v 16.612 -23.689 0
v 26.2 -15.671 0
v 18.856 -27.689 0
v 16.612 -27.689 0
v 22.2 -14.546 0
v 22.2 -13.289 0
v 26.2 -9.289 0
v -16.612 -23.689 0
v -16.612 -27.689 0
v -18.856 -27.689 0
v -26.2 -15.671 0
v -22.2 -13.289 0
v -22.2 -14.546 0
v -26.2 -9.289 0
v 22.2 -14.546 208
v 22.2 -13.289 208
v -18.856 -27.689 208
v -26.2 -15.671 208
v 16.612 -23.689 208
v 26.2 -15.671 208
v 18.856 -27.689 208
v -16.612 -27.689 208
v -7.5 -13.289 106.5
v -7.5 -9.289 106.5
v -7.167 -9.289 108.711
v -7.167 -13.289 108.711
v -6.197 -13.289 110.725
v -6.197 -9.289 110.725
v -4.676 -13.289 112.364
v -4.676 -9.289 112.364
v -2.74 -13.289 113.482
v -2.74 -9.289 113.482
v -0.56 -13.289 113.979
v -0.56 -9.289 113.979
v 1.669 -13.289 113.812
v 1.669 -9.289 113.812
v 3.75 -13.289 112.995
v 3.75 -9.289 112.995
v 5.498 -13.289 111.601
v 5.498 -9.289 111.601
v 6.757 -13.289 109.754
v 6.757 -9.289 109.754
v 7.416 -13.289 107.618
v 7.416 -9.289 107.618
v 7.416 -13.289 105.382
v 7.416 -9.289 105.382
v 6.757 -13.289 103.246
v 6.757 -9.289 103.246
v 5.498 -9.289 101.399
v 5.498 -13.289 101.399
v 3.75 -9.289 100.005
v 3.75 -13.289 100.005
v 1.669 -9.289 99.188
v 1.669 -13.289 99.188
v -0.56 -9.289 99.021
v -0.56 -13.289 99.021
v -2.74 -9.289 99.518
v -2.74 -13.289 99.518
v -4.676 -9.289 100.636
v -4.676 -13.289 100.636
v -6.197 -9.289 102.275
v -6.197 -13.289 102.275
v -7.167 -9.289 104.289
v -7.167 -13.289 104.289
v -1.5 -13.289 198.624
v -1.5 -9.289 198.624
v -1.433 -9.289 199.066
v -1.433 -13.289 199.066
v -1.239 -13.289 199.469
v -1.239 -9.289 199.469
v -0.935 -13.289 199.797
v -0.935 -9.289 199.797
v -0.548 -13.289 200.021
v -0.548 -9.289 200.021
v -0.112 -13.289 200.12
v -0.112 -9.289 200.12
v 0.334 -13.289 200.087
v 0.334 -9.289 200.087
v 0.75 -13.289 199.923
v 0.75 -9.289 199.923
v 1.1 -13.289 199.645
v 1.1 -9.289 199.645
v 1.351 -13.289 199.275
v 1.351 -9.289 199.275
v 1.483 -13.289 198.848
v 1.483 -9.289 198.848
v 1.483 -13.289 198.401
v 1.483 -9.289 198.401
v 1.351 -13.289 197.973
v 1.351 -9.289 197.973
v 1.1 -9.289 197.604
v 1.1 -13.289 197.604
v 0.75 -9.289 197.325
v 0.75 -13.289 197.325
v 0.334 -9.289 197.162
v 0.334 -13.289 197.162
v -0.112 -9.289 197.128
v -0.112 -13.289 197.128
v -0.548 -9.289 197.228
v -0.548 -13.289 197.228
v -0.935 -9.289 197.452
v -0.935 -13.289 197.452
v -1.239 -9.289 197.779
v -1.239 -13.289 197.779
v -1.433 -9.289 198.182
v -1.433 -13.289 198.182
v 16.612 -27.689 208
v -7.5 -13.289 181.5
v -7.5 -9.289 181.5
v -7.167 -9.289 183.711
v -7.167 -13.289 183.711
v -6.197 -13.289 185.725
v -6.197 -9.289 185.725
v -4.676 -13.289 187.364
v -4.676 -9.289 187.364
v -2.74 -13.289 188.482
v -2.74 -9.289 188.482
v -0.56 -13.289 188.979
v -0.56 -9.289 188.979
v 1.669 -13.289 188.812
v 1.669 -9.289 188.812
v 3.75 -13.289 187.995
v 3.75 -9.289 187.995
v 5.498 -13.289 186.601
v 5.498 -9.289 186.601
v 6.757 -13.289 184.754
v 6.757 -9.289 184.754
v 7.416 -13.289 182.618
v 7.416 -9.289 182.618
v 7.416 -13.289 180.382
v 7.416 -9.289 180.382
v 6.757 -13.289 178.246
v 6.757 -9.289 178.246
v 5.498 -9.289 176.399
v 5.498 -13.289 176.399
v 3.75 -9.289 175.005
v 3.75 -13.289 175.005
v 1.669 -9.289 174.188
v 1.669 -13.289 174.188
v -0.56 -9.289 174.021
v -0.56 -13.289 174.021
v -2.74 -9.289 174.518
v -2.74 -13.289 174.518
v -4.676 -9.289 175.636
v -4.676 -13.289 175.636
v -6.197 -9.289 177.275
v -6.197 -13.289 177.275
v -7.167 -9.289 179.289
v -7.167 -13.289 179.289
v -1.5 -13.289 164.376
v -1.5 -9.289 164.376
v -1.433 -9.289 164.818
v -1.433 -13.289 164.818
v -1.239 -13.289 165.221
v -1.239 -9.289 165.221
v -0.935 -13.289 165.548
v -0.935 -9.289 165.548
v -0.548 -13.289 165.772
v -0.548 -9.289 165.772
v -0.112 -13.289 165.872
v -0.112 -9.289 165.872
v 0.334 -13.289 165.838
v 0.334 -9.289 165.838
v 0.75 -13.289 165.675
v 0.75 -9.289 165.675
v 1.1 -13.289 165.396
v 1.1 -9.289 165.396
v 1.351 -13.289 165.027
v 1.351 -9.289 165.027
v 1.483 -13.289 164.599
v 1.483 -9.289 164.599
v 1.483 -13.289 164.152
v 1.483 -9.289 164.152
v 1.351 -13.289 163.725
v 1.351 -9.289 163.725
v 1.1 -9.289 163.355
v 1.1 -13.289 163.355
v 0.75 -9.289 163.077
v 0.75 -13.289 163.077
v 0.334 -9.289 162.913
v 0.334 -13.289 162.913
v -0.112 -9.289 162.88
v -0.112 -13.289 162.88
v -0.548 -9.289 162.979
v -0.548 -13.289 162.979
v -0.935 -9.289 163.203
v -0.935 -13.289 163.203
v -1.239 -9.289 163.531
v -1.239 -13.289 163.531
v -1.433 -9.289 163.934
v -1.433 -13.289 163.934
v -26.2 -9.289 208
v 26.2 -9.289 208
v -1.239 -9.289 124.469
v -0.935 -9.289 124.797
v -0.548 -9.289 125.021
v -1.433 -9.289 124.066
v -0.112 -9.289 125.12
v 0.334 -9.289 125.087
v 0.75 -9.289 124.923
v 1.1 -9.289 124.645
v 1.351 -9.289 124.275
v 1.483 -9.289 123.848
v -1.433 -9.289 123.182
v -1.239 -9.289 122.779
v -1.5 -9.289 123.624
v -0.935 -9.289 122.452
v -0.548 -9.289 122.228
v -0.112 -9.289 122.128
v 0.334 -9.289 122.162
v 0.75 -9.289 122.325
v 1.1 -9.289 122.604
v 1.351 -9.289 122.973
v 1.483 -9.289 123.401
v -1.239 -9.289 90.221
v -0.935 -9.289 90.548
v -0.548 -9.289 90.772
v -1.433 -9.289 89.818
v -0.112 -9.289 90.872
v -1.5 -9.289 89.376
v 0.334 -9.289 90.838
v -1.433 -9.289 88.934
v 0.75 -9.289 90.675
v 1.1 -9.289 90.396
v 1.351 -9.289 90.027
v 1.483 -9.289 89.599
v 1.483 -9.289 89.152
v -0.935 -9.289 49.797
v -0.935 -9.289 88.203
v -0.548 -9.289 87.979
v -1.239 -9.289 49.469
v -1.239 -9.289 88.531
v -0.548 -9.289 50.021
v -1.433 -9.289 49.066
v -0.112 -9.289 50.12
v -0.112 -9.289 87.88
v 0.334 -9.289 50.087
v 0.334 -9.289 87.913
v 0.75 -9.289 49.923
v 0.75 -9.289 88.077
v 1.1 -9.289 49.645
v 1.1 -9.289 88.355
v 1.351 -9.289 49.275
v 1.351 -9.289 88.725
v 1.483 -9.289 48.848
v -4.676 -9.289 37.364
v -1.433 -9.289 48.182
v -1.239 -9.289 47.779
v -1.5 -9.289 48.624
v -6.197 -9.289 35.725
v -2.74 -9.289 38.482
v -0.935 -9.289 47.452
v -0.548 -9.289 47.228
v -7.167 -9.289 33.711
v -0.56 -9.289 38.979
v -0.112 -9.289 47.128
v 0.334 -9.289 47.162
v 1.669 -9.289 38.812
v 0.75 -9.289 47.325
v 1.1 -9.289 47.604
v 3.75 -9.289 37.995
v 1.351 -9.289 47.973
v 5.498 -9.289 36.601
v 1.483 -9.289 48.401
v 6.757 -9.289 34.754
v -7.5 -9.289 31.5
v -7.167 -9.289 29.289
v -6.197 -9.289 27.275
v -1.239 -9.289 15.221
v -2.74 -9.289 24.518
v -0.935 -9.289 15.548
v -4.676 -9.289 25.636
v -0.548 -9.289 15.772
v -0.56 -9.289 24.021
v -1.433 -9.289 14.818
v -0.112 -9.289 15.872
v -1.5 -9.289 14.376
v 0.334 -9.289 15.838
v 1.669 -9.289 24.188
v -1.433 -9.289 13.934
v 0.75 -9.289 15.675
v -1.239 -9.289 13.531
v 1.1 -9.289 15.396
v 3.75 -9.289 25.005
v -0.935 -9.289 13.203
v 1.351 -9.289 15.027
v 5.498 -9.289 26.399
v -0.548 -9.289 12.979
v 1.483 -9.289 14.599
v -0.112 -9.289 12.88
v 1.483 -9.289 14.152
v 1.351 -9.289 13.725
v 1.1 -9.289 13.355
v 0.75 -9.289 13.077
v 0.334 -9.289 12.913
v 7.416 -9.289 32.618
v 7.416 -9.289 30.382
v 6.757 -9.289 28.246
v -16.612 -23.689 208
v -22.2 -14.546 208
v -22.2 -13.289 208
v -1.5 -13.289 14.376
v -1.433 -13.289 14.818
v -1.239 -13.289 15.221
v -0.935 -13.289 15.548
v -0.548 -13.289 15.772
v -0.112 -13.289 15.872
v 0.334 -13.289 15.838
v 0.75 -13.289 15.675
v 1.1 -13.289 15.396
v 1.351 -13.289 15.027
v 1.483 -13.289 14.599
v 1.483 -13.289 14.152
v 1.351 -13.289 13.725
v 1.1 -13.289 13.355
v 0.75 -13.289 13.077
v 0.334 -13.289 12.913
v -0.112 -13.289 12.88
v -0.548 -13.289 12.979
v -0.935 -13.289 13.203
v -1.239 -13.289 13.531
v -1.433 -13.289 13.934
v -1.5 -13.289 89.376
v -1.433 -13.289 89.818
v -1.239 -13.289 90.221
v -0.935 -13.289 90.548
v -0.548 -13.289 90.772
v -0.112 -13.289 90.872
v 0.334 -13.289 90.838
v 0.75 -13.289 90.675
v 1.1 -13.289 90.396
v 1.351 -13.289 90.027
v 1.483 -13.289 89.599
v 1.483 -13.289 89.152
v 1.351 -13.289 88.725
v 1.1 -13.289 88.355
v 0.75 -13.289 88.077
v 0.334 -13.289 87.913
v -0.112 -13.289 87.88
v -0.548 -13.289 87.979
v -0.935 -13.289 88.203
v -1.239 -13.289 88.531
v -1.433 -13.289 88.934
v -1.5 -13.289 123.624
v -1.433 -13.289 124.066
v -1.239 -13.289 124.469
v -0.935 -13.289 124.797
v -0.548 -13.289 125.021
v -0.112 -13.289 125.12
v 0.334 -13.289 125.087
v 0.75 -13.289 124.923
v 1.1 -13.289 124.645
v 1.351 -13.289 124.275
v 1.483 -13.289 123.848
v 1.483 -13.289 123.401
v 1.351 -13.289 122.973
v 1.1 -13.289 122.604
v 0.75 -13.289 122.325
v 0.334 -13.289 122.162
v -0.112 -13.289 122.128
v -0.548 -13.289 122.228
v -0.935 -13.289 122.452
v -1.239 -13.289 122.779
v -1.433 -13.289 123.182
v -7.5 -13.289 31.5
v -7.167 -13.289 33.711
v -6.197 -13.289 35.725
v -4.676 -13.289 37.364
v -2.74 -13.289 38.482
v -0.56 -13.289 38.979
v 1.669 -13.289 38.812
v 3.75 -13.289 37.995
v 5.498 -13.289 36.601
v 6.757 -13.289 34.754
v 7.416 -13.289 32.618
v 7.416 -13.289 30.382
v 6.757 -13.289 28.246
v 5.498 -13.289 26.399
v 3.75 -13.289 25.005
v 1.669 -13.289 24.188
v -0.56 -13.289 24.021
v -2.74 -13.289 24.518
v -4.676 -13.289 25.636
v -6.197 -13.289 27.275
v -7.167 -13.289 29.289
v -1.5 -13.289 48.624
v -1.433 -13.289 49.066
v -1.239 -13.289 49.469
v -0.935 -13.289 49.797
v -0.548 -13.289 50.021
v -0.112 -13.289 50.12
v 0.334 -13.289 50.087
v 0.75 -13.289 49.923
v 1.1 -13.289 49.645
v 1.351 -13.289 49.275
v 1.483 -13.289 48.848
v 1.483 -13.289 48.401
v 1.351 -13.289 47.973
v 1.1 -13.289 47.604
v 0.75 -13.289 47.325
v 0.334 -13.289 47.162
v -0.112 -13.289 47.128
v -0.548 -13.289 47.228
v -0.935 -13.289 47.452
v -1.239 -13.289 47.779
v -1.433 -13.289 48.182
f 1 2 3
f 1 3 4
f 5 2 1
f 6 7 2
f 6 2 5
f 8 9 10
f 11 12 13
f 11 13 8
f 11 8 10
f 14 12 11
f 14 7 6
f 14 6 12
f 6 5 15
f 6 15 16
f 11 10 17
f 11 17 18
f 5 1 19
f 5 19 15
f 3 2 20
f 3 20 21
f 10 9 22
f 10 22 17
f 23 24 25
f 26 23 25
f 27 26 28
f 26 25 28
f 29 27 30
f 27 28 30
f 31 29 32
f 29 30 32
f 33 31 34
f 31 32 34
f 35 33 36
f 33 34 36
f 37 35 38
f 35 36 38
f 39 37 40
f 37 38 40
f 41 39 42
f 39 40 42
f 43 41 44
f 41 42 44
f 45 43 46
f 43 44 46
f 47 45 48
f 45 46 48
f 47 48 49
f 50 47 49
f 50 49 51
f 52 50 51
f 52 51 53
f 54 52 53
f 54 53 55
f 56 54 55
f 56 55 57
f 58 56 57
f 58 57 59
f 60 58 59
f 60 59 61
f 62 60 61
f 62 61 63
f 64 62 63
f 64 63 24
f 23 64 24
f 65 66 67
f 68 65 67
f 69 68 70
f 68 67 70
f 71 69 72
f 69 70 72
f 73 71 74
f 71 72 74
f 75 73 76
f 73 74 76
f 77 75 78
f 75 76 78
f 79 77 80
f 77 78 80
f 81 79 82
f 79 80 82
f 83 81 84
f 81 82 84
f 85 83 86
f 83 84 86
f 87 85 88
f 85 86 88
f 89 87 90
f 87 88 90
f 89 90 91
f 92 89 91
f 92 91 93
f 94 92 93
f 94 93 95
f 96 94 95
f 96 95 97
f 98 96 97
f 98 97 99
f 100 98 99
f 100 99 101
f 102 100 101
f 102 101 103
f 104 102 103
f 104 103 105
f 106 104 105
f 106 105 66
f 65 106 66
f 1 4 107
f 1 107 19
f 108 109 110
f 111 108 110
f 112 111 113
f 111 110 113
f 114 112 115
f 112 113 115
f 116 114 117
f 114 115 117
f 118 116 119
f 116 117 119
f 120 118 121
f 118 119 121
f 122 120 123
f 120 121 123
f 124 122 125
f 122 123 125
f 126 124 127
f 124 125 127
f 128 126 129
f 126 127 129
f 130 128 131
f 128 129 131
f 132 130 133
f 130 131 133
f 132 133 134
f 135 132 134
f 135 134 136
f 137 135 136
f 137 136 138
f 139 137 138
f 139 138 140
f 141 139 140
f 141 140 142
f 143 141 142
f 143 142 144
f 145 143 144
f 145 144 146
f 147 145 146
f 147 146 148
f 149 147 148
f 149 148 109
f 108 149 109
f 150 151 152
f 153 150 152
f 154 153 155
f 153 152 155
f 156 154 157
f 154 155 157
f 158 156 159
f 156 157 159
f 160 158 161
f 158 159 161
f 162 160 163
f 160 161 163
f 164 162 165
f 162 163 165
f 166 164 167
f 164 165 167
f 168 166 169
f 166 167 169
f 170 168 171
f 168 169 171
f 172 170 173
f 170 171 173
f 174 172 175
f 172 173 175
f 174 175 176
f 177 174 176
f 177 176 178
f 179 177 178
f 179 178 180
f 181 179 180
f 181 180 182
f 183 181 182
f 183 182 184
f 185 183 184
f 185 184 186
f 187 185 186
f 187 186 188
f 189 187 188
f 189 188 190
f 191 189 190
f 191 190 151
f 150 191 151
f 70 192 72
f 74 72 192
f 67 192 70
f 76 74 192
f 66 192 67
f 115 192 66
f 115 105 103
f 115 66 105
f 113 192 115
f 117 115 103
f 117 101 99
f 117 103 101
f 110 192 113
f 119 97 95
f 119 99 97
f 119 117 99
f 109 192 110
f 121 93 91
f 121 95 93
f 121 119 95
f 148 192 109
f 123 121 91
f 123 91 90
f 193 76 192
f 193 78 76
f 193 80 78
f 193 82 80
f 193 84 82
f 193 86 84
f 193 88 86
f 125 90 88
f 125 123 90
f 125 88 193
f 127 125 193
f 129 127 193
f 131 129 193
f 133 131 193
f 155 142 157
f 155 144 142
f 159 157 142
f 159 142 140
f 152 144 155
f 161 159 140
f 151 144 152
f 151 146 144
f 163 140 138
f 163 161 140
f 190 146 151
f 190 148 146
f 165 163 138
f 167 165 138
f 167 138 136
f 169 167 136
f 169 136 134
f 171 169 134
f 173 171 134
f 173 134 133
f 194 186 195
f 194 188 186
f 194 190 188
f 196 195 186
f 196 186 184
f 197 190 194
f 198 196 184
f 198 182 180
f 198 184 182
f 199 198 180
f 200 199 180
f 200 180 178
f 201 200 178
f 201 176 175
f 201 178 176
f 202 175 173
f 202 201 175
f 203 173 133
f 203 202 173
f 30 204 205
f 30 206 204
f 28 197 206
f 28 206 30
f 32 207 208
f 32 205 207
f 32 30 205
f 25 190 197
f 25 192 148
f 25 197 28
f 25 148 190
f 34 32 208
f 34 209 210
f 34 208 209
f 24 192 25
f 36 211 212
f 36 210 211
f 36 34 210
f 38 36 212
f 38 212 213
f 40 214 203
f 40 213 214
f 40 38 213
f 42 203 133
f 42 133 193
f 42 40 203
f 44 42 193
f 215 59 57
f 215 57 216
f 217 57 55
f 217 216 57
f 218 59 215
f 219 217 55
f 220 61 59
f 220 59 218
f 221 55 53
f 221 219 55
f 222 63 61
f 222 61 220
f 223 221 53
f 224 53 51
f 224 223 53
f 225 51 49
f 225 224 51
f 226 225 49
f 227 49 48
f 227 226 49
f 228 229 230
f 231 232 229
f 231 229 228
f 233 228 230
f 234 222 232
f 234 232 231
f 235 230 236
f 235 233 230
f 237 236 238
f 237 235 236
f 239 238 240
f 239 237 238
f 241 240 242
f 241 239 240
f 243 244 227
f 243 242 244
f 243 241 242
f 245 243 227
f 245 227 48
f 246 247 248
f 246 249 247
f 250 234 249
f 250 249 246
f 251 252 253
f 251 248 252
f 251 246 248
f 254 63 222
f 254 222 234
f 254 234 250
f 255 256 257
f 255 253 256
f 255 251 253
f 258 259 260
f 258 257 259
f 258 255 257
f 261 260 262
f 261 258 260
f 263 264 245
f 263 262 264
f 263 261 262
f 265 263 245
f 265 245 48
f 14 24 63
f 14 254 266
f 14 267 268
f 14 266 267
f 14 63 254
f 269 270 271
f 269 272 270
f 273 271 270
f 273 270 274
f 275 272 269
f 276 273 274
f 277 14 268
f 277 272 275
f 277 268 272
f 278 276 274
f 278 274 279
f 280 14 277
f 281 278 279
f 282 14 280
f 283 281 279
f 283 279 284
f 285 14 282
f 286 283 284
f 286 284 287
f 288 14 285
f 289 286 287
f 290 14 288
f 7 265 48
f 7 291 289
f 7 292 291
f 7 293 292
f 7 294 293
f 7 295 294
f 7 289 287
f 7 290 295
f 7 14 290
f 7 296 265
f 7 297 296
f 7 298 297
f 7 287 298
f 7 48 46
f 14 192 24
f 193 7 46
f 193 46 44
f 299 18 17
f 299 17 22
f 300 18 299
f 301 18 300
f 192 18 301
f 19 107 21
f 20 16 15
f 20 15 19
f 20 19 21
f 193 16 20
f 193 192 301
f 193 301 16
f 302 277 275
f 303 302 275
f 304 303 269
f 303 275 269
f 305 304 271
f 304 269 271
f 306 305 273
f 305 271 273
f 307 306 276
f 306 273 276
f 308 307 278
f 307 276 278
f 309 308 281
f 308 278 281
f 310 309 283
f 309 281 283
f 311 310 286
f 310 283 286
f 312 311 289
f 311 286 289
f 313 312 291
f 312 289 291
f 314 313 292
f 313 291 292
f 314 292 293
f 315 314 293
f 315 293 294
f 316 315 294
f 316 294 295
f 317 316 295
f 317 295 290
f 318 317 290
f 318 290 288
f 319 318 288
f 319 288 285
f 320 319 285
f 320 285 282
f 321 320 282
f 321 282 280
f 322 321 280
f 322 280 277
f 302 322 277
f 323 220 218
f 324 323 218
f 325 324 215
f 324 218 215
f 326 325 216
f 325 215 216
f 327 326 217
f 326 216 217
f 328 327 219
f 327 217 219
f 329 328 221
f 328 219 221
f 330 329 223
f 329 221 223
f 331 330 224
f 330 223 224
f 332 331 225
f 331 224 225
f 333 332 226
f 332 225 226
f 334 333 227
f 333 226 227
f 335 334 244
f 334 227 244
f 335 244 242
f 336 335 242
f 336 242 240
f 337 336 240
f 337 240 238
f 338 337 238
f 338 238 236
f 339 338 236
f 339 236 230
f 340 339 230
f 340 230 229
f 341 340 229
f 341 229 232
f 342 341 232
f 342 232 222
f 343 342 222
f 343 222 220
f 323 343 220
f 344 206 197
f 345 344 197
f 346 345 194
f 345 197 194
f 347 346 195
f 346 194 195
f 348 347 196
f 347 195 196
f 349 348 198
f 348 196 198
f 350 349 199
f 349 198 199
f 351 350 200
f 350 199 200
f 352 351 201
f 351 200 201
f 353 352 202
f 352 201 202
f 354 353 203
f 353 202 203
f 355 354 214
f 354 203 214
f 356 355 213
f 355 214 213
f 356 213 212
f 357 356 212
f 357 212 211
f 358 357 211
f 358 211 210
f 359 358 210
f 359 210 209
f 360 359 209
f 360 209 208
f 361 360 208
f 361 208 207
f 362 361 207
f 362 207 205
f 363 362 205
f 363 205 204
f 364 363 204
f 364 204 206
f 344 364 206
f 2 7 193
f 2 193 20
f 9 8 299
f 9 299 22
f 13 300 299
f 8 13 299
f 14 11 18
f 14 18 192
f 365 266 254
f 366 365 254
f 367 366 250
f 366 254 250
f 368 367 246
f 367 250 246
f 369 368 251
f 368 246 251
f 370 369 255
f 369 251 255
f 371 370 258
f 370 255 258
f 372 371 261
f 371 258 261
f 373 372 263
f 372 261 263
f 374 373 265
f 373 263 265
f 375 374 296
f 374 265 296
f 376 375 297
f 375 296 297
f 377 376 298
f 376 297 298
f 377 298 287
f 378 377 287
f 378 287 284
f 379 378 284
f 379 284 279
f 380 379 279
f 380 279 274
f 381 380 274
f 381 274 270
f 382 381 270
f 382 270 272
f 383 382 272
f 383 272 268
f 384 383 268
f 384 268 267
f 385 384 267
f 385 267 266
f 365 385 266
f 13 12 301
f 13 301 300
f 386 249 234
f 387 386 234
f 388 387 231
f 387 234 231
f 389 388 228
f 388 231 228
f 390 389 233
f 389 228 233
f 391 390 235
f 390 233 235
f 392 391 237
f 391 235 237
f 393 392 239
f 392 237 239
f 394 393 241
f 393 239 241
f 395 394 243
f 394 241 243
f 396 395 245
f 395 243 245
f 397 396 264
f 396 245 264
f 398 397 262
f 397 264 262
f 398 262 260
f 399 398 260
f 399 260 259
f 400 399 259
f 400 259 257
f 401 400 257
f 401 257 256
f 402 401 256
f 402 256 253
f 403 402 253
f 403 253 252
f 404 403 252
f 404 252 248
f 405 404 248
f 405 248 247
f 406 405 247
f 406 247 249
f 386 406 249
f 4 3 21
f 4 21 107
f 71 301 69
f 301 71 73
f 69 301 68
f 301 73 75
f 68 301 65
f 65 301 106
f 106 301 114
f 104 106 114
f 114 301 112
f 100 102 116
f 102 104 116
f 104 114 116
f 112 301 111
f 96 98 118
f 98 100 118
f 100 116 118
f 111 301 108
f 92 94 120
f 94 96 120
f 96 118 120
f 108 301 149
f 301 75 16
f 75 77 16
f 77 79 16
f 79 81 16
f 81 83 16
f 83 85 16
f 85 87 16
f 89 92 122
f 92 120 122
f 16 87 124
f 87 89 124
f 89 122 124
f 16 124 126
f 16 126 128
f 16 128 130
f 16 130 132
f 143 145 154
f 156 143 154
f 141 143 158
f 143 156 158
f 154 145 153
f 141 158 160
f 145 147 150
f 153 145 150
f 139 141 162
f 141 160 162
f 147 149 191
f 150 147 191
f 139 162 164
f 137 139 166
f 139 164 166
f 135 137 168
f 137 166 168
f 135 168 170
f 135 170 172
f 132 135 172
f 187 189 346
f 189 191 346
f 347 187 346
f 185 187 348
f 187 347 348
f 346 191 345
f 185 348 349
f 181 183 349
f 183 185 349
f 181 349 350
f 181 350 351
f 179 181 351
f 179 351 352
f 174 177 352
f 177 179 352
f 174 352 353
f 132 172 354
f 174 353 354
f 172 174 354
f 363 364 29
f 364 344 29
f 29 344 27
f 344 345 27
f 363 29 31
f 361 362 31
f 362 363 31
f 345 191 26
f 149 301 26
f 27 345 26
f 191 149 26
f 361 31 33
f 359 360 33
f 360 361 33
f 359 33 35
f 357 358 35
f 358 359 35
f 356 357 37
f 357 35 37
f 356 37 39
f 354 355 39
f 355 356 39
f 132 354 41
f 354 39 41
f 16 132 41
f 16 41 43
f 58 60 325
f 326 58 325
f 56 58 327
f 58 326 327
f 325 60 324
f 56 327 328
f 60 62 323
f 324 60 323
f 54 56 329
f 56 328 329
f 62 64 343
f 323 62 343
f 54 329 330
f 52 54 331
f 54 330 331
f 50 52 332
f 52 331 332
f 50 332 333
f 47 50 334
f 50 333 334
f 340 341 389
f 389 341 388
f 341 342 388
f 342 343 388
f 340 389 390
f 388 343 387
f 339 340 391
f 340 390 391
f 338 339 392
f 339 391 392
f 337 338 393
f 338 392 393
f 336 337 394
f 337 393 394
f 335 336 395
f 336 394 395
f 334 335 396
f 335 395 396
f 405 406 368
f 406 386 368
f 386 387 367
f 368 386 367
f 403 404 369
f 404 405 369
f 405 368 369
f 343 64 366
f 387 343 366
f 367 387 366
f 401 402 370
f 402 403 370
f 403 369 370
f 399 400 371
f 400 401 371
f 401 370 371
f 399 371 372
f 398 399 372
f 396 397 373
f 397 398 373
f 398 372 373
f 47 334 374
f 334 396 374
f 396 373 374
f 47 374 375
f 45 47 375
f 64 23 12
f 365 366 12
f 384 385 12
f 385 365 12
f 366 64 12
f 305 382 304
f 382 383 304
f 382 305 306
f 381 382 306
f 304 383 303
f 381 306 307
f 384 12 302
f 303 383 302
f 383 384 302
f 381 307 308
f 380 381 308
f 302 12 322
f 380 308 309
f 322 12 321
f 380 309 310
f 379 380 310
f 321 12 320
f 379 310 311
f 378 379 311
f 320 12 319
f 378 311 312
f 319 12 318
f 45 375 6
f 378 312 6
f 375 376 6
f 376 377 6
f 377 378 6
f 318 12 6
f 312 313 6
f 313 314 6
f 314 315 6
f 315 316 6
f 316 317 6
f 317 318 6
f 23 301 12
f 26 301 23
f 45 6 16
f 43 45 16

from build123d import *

# Parameters (mm, degrees)
BOSS_EXTRUDE1_DEPTH        = 213
SKETCH2_R                  = 7.5
CUT_EXTRUDE1_DEPTH         = 213
SKETCH7_R                  = 1.5
CUT_EXTRUDE2_DEPTH         = 10
LPATTERN1_COUNT            = 3
LPATTERN1_PITCH            = 75
SZKIC1_W                   = 52.4
SZKIC1_H                   = 5
WYTNIJ_WYCI_GNI_CIE1_DEPTH = 30.5


with BuildPart() as part:
    # Sketch1 → Boss-Extrude1 (new body)
    with BuildSketch(Plane.XY):
        Polygon((0, -13.289354466), (-22.2, -13.289354466), (-22.2, -14.545627613), (-16.612166923, -23.689354466), (-16.612166923, -27.689354466), (-18.855505392, -27.689354466), (-26.2, -15.671090562), (-26.2, -9.289354466), (26.2, -9.289354466), (26.2, -15.671090562), (18.855505392, -27.689354466), (16.612166923, -27.689354466), (16.612166923, -23.689354466), (22.2, -14.545627613), (22.2, -13.289354466), align=None)
    extrude(amount=BOSS_EXTRUDE1_DEPTH)

    # Sketch2 → Cut-Extrude1 (cut)
    with BuildSketch(Plane(origin=(0, -9.289354466, 0), x_dir=(1, 0, 0), z_dir=(0, 1, 0))):
        with Locations(Location((0, -31.5, 0), (0, 0, 180))):
            Circle(SKETCH2_R)
        with Locations(Location((0, -106.5, 0), (0, 0, 180))):
            Circle(SKETCH2_R)
        with Locations(Location((0, -181.5, 0), (0, 0, 180))):
            Circle(SKETCH2_R)
    extrude(amount=-CUT_EXTRUDE1_DEPTH, mode=Mode.SUBTRACT)

    # Sketch7 → Cut-Extrude2 (cut)
    with BuildSketch(Plane(origin=(0, -9.289354466, 0), x_dir=(1, 0, 0), z_dir=(0, 1, 0))):
        with Locations(Location((0, -198.624297731, 0), (0, 0, 180))):
            Circle(SKETCH7_R)
        with Locations(Location((0, -164.375702269, 0), (0, 0, 180))):
            Circle(SKETCH7_R)
    cut_extrude2 = extrude(amount=-CUT_EXTRUDE2_DEPTH, mode=Mode.SUBTRACT)

    # LPattern1: Cut-Extrude2 ×3
    with Locations(*[(0, 0, -i * LPATTERN1_PITCH) for i in range(1, LPATTERN1_COUNT)]):
        add(cut_extrude2, mode=Mode.SUBTRACT)

    # Szkic1 → Wytnij-wyciągnięcie1 (cut)
    with BuildSketch(Plane(origin=(0, -9.289354466, 0), x_dir=(1, 0, 0), z_dir=(0, 1, 0))):
        with Locations((0, -210.5)):
            Rectangle(SZKIC1_W, SZKIC1_H)
    extrude(amount=-WYTNIJ_WYCI_GNI_CIE1_DEPTH, mode=Mode.SUBTRACT)


solid = part.part
